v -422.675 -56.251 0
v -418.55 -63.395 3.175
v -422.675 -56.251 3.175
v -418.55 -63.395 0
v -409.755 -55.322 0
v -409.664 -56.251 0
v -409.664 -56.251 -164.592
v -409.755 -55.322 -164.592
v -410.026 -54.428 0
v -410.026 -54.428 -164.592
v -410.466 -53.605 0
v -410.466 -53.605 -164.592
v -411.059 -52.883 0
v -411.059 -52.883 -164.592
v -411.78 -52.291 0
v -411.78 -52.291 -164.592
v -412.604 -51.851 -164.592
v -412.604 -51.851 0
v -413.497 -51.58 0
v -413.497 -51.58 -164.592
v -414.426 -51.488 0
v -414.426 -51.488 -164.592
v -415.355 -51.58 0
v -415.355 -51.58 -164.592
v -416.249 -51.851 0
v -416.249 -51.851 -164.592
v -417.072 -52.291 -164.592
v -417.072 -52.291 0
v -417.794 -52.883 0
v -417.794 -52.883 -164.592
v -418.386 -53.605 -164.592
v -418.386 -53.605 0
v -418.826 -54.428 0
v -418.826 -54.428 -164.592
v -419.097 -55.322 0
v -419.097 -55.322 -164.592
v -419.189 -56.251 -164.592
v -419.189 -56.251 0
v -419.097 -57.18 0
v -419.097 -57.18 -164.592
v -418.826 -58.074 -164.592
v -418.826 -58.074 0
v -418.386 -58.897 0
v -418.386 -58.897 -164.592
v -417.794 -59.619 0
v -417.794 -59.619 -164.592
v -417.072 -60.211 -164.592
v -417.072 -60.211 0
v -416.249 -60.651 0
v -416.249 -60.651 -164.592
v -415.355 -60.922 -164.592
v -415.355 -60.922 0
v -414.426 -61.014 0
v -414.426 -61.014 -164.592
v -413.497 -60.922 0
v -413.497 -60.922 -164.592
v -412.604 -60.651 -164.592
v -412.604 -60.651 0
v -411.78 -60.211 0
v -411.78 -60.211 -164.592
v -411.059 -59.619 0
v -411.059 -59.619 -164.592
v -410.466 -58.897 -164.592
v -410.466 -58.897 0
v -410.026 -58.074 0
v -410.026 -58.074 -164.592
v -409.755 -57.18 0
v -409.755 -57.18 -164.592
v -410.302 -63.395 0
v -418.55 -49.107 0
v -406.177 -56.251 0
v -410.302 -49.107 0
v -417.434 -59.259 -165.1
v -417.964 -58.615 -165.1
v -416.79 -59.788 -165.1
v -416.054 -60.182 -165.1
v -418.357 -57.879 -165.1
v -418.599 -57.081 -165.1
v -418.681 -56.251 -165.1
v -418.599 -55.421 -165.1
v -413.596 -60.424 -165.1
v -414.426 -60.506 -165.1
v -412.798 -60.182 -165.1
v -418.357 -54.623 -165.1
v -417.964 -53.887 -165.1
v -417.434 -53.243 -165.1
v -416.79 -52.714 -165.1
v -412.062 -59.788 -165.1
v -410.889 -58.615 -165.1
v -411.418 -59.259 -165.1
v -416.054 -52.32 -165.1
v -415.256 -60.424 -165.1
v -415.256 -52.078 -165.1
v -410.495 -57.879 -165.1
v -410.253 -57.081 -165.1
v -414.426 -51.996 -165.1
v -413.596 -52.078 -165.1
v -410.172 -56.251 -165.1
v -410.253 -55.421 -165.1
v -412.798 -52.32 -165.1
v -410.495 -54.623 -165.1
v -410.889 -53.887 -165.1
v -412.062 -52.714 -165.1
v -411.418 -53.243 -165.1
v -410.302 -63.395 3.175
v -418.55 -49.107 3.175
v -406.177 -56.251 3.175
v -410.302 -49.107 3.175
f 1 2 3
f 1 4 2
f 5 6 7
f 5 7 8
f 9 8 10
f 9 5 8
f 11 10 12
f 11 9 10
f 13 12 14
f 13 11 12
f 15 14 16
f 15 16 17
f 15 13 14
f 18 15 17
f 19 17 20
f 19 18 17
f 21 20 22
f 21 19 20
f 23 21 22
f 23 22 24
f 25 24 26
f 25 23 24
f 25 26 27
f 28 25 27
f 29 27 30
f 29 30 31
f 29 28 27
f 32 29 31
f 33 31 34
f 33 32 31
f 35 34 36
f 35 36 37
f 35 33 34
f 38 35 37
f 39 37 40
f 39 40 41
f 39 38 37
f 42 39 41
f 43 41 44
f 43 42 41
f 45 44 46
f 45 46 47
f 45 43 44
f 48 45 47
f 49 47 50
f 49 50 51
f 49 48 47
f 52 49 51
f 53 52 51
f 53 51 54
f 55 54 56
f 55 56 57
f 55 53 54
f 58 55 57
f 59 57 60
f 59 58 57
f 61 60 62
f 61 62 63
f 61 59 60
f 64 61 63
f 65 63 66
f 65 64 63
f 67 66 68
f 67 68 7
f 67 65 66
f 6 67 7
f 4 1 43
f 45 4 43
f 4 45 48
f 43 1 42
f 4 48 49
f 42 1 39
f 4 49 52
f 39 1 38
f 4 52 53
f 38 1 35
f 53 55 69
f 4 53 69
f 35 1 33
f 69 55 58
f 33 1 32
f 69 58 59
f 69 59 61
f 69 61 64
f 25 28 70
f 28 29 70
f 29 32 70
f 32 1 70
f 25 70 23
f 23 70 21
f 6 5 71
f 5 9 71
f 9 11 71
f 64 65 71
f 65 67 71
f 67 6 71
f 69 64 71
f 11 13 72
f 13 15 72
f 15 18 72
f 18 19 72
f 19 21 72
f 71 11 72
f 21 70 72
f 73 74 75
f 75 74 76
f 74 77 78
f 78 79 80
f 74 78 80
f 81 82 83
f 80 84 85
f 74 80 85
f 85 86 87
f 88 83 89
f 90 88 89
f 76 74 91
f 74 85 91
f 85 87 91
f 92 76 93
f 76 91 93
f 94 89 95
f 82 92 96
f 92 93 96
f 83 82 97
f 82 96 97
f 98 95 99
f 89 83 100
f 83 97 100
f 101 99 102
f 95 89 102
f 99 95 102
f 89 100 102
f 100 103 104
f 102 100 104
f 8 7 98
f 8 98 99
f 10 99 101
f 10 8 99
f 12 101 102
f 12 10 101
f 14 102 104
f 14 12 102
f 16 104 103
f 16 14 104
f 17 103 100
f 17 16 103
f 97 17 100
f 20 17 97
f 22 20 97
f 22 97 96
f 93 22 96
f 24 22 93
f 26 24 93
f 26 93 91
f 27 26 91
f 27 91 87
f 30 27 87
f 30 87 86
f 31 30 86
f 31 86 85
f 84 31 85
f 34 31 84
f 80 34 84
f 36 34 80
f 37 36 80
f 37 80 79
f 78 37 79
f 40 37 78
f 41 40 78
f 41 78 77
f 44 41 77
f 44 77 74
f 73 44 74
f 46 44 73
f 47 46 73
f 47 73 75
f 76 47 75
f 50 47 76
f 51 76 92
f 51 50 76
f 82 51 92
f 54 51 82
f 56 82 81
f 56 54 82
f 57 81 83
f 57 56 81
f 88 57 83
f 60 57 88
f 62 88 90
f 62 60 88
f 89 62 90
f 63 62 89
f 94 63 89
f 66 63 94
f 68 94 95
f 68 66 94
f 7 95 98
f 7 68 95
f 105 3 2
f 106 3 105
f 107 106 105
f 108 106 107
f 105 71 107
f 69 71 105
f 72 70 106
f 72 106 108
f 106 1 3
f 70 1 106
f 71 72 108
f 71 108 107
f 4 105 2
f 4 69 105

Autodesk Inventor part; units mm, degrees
ref_plane "YZ Plane" through (0, 0, 0) normal (1, 0, 0) x (0, 1, 0)
ref_plane "XZ Plane" through (0, 0, 0) normal (0, 1, 0) x (-1, 0, 0)
ref_plane "XY Plane" through (0, 0, 0) normal (0, 0, 1) x (1, 0, 0)
sketch "Sketch1" plane through (0, 0, 0) normal (0, 0, 1) x (1, 0, 0)
  circle A0 centre (-414.4261, -56.251) radius 4.7625
  point P0 (0, 0)
  dimension "d0" = 9.525
extrude "Extrusion1" add sketch "Sketch1" against normal blind 165.1
sketch "Sketch2" plane through (-414.4261, -56.251, 0) normal (0, 0, 1) x (1, 0, 0)
  circle A0 centre (0, 0) radius 4.7625 projected
  line L0 (-8.2489, 0) -> (-4.1244, 7.1437)
  line L1 (-4.1244, 7.1437) -> (4.1244, 7.1438)
  line L2 (4.1244, 7.1438) -> (8.2489, 0)
  line L3 (8.2489, 0) -> (4.1244, -7.1437)
  line L4 (4.1244, -7.1437) -> (-4.1244, -7.1438)
  line L5 (-4.1244, -7.1438) -> (-8.2489, 0)
  point P0 (414.4261, 56.251)
  dimension "d3" = 14.2875
extrude "Extrusion2" add sketch "Sketch2" along normal blind 3.175 contours A0 | L0 L1 L2 L3 L4 L5
thread "Thread1" size "3/8-16 UNC" class "2A" standard "ANSI Unified Screw Threads" length 25.4
chamfer "Chamfer1" distance 0.508 angle 45 1 edges at (-419.1886, -56.251, -165.1)
properties part number "38-16 hexbolt x6500" material "Steel"
